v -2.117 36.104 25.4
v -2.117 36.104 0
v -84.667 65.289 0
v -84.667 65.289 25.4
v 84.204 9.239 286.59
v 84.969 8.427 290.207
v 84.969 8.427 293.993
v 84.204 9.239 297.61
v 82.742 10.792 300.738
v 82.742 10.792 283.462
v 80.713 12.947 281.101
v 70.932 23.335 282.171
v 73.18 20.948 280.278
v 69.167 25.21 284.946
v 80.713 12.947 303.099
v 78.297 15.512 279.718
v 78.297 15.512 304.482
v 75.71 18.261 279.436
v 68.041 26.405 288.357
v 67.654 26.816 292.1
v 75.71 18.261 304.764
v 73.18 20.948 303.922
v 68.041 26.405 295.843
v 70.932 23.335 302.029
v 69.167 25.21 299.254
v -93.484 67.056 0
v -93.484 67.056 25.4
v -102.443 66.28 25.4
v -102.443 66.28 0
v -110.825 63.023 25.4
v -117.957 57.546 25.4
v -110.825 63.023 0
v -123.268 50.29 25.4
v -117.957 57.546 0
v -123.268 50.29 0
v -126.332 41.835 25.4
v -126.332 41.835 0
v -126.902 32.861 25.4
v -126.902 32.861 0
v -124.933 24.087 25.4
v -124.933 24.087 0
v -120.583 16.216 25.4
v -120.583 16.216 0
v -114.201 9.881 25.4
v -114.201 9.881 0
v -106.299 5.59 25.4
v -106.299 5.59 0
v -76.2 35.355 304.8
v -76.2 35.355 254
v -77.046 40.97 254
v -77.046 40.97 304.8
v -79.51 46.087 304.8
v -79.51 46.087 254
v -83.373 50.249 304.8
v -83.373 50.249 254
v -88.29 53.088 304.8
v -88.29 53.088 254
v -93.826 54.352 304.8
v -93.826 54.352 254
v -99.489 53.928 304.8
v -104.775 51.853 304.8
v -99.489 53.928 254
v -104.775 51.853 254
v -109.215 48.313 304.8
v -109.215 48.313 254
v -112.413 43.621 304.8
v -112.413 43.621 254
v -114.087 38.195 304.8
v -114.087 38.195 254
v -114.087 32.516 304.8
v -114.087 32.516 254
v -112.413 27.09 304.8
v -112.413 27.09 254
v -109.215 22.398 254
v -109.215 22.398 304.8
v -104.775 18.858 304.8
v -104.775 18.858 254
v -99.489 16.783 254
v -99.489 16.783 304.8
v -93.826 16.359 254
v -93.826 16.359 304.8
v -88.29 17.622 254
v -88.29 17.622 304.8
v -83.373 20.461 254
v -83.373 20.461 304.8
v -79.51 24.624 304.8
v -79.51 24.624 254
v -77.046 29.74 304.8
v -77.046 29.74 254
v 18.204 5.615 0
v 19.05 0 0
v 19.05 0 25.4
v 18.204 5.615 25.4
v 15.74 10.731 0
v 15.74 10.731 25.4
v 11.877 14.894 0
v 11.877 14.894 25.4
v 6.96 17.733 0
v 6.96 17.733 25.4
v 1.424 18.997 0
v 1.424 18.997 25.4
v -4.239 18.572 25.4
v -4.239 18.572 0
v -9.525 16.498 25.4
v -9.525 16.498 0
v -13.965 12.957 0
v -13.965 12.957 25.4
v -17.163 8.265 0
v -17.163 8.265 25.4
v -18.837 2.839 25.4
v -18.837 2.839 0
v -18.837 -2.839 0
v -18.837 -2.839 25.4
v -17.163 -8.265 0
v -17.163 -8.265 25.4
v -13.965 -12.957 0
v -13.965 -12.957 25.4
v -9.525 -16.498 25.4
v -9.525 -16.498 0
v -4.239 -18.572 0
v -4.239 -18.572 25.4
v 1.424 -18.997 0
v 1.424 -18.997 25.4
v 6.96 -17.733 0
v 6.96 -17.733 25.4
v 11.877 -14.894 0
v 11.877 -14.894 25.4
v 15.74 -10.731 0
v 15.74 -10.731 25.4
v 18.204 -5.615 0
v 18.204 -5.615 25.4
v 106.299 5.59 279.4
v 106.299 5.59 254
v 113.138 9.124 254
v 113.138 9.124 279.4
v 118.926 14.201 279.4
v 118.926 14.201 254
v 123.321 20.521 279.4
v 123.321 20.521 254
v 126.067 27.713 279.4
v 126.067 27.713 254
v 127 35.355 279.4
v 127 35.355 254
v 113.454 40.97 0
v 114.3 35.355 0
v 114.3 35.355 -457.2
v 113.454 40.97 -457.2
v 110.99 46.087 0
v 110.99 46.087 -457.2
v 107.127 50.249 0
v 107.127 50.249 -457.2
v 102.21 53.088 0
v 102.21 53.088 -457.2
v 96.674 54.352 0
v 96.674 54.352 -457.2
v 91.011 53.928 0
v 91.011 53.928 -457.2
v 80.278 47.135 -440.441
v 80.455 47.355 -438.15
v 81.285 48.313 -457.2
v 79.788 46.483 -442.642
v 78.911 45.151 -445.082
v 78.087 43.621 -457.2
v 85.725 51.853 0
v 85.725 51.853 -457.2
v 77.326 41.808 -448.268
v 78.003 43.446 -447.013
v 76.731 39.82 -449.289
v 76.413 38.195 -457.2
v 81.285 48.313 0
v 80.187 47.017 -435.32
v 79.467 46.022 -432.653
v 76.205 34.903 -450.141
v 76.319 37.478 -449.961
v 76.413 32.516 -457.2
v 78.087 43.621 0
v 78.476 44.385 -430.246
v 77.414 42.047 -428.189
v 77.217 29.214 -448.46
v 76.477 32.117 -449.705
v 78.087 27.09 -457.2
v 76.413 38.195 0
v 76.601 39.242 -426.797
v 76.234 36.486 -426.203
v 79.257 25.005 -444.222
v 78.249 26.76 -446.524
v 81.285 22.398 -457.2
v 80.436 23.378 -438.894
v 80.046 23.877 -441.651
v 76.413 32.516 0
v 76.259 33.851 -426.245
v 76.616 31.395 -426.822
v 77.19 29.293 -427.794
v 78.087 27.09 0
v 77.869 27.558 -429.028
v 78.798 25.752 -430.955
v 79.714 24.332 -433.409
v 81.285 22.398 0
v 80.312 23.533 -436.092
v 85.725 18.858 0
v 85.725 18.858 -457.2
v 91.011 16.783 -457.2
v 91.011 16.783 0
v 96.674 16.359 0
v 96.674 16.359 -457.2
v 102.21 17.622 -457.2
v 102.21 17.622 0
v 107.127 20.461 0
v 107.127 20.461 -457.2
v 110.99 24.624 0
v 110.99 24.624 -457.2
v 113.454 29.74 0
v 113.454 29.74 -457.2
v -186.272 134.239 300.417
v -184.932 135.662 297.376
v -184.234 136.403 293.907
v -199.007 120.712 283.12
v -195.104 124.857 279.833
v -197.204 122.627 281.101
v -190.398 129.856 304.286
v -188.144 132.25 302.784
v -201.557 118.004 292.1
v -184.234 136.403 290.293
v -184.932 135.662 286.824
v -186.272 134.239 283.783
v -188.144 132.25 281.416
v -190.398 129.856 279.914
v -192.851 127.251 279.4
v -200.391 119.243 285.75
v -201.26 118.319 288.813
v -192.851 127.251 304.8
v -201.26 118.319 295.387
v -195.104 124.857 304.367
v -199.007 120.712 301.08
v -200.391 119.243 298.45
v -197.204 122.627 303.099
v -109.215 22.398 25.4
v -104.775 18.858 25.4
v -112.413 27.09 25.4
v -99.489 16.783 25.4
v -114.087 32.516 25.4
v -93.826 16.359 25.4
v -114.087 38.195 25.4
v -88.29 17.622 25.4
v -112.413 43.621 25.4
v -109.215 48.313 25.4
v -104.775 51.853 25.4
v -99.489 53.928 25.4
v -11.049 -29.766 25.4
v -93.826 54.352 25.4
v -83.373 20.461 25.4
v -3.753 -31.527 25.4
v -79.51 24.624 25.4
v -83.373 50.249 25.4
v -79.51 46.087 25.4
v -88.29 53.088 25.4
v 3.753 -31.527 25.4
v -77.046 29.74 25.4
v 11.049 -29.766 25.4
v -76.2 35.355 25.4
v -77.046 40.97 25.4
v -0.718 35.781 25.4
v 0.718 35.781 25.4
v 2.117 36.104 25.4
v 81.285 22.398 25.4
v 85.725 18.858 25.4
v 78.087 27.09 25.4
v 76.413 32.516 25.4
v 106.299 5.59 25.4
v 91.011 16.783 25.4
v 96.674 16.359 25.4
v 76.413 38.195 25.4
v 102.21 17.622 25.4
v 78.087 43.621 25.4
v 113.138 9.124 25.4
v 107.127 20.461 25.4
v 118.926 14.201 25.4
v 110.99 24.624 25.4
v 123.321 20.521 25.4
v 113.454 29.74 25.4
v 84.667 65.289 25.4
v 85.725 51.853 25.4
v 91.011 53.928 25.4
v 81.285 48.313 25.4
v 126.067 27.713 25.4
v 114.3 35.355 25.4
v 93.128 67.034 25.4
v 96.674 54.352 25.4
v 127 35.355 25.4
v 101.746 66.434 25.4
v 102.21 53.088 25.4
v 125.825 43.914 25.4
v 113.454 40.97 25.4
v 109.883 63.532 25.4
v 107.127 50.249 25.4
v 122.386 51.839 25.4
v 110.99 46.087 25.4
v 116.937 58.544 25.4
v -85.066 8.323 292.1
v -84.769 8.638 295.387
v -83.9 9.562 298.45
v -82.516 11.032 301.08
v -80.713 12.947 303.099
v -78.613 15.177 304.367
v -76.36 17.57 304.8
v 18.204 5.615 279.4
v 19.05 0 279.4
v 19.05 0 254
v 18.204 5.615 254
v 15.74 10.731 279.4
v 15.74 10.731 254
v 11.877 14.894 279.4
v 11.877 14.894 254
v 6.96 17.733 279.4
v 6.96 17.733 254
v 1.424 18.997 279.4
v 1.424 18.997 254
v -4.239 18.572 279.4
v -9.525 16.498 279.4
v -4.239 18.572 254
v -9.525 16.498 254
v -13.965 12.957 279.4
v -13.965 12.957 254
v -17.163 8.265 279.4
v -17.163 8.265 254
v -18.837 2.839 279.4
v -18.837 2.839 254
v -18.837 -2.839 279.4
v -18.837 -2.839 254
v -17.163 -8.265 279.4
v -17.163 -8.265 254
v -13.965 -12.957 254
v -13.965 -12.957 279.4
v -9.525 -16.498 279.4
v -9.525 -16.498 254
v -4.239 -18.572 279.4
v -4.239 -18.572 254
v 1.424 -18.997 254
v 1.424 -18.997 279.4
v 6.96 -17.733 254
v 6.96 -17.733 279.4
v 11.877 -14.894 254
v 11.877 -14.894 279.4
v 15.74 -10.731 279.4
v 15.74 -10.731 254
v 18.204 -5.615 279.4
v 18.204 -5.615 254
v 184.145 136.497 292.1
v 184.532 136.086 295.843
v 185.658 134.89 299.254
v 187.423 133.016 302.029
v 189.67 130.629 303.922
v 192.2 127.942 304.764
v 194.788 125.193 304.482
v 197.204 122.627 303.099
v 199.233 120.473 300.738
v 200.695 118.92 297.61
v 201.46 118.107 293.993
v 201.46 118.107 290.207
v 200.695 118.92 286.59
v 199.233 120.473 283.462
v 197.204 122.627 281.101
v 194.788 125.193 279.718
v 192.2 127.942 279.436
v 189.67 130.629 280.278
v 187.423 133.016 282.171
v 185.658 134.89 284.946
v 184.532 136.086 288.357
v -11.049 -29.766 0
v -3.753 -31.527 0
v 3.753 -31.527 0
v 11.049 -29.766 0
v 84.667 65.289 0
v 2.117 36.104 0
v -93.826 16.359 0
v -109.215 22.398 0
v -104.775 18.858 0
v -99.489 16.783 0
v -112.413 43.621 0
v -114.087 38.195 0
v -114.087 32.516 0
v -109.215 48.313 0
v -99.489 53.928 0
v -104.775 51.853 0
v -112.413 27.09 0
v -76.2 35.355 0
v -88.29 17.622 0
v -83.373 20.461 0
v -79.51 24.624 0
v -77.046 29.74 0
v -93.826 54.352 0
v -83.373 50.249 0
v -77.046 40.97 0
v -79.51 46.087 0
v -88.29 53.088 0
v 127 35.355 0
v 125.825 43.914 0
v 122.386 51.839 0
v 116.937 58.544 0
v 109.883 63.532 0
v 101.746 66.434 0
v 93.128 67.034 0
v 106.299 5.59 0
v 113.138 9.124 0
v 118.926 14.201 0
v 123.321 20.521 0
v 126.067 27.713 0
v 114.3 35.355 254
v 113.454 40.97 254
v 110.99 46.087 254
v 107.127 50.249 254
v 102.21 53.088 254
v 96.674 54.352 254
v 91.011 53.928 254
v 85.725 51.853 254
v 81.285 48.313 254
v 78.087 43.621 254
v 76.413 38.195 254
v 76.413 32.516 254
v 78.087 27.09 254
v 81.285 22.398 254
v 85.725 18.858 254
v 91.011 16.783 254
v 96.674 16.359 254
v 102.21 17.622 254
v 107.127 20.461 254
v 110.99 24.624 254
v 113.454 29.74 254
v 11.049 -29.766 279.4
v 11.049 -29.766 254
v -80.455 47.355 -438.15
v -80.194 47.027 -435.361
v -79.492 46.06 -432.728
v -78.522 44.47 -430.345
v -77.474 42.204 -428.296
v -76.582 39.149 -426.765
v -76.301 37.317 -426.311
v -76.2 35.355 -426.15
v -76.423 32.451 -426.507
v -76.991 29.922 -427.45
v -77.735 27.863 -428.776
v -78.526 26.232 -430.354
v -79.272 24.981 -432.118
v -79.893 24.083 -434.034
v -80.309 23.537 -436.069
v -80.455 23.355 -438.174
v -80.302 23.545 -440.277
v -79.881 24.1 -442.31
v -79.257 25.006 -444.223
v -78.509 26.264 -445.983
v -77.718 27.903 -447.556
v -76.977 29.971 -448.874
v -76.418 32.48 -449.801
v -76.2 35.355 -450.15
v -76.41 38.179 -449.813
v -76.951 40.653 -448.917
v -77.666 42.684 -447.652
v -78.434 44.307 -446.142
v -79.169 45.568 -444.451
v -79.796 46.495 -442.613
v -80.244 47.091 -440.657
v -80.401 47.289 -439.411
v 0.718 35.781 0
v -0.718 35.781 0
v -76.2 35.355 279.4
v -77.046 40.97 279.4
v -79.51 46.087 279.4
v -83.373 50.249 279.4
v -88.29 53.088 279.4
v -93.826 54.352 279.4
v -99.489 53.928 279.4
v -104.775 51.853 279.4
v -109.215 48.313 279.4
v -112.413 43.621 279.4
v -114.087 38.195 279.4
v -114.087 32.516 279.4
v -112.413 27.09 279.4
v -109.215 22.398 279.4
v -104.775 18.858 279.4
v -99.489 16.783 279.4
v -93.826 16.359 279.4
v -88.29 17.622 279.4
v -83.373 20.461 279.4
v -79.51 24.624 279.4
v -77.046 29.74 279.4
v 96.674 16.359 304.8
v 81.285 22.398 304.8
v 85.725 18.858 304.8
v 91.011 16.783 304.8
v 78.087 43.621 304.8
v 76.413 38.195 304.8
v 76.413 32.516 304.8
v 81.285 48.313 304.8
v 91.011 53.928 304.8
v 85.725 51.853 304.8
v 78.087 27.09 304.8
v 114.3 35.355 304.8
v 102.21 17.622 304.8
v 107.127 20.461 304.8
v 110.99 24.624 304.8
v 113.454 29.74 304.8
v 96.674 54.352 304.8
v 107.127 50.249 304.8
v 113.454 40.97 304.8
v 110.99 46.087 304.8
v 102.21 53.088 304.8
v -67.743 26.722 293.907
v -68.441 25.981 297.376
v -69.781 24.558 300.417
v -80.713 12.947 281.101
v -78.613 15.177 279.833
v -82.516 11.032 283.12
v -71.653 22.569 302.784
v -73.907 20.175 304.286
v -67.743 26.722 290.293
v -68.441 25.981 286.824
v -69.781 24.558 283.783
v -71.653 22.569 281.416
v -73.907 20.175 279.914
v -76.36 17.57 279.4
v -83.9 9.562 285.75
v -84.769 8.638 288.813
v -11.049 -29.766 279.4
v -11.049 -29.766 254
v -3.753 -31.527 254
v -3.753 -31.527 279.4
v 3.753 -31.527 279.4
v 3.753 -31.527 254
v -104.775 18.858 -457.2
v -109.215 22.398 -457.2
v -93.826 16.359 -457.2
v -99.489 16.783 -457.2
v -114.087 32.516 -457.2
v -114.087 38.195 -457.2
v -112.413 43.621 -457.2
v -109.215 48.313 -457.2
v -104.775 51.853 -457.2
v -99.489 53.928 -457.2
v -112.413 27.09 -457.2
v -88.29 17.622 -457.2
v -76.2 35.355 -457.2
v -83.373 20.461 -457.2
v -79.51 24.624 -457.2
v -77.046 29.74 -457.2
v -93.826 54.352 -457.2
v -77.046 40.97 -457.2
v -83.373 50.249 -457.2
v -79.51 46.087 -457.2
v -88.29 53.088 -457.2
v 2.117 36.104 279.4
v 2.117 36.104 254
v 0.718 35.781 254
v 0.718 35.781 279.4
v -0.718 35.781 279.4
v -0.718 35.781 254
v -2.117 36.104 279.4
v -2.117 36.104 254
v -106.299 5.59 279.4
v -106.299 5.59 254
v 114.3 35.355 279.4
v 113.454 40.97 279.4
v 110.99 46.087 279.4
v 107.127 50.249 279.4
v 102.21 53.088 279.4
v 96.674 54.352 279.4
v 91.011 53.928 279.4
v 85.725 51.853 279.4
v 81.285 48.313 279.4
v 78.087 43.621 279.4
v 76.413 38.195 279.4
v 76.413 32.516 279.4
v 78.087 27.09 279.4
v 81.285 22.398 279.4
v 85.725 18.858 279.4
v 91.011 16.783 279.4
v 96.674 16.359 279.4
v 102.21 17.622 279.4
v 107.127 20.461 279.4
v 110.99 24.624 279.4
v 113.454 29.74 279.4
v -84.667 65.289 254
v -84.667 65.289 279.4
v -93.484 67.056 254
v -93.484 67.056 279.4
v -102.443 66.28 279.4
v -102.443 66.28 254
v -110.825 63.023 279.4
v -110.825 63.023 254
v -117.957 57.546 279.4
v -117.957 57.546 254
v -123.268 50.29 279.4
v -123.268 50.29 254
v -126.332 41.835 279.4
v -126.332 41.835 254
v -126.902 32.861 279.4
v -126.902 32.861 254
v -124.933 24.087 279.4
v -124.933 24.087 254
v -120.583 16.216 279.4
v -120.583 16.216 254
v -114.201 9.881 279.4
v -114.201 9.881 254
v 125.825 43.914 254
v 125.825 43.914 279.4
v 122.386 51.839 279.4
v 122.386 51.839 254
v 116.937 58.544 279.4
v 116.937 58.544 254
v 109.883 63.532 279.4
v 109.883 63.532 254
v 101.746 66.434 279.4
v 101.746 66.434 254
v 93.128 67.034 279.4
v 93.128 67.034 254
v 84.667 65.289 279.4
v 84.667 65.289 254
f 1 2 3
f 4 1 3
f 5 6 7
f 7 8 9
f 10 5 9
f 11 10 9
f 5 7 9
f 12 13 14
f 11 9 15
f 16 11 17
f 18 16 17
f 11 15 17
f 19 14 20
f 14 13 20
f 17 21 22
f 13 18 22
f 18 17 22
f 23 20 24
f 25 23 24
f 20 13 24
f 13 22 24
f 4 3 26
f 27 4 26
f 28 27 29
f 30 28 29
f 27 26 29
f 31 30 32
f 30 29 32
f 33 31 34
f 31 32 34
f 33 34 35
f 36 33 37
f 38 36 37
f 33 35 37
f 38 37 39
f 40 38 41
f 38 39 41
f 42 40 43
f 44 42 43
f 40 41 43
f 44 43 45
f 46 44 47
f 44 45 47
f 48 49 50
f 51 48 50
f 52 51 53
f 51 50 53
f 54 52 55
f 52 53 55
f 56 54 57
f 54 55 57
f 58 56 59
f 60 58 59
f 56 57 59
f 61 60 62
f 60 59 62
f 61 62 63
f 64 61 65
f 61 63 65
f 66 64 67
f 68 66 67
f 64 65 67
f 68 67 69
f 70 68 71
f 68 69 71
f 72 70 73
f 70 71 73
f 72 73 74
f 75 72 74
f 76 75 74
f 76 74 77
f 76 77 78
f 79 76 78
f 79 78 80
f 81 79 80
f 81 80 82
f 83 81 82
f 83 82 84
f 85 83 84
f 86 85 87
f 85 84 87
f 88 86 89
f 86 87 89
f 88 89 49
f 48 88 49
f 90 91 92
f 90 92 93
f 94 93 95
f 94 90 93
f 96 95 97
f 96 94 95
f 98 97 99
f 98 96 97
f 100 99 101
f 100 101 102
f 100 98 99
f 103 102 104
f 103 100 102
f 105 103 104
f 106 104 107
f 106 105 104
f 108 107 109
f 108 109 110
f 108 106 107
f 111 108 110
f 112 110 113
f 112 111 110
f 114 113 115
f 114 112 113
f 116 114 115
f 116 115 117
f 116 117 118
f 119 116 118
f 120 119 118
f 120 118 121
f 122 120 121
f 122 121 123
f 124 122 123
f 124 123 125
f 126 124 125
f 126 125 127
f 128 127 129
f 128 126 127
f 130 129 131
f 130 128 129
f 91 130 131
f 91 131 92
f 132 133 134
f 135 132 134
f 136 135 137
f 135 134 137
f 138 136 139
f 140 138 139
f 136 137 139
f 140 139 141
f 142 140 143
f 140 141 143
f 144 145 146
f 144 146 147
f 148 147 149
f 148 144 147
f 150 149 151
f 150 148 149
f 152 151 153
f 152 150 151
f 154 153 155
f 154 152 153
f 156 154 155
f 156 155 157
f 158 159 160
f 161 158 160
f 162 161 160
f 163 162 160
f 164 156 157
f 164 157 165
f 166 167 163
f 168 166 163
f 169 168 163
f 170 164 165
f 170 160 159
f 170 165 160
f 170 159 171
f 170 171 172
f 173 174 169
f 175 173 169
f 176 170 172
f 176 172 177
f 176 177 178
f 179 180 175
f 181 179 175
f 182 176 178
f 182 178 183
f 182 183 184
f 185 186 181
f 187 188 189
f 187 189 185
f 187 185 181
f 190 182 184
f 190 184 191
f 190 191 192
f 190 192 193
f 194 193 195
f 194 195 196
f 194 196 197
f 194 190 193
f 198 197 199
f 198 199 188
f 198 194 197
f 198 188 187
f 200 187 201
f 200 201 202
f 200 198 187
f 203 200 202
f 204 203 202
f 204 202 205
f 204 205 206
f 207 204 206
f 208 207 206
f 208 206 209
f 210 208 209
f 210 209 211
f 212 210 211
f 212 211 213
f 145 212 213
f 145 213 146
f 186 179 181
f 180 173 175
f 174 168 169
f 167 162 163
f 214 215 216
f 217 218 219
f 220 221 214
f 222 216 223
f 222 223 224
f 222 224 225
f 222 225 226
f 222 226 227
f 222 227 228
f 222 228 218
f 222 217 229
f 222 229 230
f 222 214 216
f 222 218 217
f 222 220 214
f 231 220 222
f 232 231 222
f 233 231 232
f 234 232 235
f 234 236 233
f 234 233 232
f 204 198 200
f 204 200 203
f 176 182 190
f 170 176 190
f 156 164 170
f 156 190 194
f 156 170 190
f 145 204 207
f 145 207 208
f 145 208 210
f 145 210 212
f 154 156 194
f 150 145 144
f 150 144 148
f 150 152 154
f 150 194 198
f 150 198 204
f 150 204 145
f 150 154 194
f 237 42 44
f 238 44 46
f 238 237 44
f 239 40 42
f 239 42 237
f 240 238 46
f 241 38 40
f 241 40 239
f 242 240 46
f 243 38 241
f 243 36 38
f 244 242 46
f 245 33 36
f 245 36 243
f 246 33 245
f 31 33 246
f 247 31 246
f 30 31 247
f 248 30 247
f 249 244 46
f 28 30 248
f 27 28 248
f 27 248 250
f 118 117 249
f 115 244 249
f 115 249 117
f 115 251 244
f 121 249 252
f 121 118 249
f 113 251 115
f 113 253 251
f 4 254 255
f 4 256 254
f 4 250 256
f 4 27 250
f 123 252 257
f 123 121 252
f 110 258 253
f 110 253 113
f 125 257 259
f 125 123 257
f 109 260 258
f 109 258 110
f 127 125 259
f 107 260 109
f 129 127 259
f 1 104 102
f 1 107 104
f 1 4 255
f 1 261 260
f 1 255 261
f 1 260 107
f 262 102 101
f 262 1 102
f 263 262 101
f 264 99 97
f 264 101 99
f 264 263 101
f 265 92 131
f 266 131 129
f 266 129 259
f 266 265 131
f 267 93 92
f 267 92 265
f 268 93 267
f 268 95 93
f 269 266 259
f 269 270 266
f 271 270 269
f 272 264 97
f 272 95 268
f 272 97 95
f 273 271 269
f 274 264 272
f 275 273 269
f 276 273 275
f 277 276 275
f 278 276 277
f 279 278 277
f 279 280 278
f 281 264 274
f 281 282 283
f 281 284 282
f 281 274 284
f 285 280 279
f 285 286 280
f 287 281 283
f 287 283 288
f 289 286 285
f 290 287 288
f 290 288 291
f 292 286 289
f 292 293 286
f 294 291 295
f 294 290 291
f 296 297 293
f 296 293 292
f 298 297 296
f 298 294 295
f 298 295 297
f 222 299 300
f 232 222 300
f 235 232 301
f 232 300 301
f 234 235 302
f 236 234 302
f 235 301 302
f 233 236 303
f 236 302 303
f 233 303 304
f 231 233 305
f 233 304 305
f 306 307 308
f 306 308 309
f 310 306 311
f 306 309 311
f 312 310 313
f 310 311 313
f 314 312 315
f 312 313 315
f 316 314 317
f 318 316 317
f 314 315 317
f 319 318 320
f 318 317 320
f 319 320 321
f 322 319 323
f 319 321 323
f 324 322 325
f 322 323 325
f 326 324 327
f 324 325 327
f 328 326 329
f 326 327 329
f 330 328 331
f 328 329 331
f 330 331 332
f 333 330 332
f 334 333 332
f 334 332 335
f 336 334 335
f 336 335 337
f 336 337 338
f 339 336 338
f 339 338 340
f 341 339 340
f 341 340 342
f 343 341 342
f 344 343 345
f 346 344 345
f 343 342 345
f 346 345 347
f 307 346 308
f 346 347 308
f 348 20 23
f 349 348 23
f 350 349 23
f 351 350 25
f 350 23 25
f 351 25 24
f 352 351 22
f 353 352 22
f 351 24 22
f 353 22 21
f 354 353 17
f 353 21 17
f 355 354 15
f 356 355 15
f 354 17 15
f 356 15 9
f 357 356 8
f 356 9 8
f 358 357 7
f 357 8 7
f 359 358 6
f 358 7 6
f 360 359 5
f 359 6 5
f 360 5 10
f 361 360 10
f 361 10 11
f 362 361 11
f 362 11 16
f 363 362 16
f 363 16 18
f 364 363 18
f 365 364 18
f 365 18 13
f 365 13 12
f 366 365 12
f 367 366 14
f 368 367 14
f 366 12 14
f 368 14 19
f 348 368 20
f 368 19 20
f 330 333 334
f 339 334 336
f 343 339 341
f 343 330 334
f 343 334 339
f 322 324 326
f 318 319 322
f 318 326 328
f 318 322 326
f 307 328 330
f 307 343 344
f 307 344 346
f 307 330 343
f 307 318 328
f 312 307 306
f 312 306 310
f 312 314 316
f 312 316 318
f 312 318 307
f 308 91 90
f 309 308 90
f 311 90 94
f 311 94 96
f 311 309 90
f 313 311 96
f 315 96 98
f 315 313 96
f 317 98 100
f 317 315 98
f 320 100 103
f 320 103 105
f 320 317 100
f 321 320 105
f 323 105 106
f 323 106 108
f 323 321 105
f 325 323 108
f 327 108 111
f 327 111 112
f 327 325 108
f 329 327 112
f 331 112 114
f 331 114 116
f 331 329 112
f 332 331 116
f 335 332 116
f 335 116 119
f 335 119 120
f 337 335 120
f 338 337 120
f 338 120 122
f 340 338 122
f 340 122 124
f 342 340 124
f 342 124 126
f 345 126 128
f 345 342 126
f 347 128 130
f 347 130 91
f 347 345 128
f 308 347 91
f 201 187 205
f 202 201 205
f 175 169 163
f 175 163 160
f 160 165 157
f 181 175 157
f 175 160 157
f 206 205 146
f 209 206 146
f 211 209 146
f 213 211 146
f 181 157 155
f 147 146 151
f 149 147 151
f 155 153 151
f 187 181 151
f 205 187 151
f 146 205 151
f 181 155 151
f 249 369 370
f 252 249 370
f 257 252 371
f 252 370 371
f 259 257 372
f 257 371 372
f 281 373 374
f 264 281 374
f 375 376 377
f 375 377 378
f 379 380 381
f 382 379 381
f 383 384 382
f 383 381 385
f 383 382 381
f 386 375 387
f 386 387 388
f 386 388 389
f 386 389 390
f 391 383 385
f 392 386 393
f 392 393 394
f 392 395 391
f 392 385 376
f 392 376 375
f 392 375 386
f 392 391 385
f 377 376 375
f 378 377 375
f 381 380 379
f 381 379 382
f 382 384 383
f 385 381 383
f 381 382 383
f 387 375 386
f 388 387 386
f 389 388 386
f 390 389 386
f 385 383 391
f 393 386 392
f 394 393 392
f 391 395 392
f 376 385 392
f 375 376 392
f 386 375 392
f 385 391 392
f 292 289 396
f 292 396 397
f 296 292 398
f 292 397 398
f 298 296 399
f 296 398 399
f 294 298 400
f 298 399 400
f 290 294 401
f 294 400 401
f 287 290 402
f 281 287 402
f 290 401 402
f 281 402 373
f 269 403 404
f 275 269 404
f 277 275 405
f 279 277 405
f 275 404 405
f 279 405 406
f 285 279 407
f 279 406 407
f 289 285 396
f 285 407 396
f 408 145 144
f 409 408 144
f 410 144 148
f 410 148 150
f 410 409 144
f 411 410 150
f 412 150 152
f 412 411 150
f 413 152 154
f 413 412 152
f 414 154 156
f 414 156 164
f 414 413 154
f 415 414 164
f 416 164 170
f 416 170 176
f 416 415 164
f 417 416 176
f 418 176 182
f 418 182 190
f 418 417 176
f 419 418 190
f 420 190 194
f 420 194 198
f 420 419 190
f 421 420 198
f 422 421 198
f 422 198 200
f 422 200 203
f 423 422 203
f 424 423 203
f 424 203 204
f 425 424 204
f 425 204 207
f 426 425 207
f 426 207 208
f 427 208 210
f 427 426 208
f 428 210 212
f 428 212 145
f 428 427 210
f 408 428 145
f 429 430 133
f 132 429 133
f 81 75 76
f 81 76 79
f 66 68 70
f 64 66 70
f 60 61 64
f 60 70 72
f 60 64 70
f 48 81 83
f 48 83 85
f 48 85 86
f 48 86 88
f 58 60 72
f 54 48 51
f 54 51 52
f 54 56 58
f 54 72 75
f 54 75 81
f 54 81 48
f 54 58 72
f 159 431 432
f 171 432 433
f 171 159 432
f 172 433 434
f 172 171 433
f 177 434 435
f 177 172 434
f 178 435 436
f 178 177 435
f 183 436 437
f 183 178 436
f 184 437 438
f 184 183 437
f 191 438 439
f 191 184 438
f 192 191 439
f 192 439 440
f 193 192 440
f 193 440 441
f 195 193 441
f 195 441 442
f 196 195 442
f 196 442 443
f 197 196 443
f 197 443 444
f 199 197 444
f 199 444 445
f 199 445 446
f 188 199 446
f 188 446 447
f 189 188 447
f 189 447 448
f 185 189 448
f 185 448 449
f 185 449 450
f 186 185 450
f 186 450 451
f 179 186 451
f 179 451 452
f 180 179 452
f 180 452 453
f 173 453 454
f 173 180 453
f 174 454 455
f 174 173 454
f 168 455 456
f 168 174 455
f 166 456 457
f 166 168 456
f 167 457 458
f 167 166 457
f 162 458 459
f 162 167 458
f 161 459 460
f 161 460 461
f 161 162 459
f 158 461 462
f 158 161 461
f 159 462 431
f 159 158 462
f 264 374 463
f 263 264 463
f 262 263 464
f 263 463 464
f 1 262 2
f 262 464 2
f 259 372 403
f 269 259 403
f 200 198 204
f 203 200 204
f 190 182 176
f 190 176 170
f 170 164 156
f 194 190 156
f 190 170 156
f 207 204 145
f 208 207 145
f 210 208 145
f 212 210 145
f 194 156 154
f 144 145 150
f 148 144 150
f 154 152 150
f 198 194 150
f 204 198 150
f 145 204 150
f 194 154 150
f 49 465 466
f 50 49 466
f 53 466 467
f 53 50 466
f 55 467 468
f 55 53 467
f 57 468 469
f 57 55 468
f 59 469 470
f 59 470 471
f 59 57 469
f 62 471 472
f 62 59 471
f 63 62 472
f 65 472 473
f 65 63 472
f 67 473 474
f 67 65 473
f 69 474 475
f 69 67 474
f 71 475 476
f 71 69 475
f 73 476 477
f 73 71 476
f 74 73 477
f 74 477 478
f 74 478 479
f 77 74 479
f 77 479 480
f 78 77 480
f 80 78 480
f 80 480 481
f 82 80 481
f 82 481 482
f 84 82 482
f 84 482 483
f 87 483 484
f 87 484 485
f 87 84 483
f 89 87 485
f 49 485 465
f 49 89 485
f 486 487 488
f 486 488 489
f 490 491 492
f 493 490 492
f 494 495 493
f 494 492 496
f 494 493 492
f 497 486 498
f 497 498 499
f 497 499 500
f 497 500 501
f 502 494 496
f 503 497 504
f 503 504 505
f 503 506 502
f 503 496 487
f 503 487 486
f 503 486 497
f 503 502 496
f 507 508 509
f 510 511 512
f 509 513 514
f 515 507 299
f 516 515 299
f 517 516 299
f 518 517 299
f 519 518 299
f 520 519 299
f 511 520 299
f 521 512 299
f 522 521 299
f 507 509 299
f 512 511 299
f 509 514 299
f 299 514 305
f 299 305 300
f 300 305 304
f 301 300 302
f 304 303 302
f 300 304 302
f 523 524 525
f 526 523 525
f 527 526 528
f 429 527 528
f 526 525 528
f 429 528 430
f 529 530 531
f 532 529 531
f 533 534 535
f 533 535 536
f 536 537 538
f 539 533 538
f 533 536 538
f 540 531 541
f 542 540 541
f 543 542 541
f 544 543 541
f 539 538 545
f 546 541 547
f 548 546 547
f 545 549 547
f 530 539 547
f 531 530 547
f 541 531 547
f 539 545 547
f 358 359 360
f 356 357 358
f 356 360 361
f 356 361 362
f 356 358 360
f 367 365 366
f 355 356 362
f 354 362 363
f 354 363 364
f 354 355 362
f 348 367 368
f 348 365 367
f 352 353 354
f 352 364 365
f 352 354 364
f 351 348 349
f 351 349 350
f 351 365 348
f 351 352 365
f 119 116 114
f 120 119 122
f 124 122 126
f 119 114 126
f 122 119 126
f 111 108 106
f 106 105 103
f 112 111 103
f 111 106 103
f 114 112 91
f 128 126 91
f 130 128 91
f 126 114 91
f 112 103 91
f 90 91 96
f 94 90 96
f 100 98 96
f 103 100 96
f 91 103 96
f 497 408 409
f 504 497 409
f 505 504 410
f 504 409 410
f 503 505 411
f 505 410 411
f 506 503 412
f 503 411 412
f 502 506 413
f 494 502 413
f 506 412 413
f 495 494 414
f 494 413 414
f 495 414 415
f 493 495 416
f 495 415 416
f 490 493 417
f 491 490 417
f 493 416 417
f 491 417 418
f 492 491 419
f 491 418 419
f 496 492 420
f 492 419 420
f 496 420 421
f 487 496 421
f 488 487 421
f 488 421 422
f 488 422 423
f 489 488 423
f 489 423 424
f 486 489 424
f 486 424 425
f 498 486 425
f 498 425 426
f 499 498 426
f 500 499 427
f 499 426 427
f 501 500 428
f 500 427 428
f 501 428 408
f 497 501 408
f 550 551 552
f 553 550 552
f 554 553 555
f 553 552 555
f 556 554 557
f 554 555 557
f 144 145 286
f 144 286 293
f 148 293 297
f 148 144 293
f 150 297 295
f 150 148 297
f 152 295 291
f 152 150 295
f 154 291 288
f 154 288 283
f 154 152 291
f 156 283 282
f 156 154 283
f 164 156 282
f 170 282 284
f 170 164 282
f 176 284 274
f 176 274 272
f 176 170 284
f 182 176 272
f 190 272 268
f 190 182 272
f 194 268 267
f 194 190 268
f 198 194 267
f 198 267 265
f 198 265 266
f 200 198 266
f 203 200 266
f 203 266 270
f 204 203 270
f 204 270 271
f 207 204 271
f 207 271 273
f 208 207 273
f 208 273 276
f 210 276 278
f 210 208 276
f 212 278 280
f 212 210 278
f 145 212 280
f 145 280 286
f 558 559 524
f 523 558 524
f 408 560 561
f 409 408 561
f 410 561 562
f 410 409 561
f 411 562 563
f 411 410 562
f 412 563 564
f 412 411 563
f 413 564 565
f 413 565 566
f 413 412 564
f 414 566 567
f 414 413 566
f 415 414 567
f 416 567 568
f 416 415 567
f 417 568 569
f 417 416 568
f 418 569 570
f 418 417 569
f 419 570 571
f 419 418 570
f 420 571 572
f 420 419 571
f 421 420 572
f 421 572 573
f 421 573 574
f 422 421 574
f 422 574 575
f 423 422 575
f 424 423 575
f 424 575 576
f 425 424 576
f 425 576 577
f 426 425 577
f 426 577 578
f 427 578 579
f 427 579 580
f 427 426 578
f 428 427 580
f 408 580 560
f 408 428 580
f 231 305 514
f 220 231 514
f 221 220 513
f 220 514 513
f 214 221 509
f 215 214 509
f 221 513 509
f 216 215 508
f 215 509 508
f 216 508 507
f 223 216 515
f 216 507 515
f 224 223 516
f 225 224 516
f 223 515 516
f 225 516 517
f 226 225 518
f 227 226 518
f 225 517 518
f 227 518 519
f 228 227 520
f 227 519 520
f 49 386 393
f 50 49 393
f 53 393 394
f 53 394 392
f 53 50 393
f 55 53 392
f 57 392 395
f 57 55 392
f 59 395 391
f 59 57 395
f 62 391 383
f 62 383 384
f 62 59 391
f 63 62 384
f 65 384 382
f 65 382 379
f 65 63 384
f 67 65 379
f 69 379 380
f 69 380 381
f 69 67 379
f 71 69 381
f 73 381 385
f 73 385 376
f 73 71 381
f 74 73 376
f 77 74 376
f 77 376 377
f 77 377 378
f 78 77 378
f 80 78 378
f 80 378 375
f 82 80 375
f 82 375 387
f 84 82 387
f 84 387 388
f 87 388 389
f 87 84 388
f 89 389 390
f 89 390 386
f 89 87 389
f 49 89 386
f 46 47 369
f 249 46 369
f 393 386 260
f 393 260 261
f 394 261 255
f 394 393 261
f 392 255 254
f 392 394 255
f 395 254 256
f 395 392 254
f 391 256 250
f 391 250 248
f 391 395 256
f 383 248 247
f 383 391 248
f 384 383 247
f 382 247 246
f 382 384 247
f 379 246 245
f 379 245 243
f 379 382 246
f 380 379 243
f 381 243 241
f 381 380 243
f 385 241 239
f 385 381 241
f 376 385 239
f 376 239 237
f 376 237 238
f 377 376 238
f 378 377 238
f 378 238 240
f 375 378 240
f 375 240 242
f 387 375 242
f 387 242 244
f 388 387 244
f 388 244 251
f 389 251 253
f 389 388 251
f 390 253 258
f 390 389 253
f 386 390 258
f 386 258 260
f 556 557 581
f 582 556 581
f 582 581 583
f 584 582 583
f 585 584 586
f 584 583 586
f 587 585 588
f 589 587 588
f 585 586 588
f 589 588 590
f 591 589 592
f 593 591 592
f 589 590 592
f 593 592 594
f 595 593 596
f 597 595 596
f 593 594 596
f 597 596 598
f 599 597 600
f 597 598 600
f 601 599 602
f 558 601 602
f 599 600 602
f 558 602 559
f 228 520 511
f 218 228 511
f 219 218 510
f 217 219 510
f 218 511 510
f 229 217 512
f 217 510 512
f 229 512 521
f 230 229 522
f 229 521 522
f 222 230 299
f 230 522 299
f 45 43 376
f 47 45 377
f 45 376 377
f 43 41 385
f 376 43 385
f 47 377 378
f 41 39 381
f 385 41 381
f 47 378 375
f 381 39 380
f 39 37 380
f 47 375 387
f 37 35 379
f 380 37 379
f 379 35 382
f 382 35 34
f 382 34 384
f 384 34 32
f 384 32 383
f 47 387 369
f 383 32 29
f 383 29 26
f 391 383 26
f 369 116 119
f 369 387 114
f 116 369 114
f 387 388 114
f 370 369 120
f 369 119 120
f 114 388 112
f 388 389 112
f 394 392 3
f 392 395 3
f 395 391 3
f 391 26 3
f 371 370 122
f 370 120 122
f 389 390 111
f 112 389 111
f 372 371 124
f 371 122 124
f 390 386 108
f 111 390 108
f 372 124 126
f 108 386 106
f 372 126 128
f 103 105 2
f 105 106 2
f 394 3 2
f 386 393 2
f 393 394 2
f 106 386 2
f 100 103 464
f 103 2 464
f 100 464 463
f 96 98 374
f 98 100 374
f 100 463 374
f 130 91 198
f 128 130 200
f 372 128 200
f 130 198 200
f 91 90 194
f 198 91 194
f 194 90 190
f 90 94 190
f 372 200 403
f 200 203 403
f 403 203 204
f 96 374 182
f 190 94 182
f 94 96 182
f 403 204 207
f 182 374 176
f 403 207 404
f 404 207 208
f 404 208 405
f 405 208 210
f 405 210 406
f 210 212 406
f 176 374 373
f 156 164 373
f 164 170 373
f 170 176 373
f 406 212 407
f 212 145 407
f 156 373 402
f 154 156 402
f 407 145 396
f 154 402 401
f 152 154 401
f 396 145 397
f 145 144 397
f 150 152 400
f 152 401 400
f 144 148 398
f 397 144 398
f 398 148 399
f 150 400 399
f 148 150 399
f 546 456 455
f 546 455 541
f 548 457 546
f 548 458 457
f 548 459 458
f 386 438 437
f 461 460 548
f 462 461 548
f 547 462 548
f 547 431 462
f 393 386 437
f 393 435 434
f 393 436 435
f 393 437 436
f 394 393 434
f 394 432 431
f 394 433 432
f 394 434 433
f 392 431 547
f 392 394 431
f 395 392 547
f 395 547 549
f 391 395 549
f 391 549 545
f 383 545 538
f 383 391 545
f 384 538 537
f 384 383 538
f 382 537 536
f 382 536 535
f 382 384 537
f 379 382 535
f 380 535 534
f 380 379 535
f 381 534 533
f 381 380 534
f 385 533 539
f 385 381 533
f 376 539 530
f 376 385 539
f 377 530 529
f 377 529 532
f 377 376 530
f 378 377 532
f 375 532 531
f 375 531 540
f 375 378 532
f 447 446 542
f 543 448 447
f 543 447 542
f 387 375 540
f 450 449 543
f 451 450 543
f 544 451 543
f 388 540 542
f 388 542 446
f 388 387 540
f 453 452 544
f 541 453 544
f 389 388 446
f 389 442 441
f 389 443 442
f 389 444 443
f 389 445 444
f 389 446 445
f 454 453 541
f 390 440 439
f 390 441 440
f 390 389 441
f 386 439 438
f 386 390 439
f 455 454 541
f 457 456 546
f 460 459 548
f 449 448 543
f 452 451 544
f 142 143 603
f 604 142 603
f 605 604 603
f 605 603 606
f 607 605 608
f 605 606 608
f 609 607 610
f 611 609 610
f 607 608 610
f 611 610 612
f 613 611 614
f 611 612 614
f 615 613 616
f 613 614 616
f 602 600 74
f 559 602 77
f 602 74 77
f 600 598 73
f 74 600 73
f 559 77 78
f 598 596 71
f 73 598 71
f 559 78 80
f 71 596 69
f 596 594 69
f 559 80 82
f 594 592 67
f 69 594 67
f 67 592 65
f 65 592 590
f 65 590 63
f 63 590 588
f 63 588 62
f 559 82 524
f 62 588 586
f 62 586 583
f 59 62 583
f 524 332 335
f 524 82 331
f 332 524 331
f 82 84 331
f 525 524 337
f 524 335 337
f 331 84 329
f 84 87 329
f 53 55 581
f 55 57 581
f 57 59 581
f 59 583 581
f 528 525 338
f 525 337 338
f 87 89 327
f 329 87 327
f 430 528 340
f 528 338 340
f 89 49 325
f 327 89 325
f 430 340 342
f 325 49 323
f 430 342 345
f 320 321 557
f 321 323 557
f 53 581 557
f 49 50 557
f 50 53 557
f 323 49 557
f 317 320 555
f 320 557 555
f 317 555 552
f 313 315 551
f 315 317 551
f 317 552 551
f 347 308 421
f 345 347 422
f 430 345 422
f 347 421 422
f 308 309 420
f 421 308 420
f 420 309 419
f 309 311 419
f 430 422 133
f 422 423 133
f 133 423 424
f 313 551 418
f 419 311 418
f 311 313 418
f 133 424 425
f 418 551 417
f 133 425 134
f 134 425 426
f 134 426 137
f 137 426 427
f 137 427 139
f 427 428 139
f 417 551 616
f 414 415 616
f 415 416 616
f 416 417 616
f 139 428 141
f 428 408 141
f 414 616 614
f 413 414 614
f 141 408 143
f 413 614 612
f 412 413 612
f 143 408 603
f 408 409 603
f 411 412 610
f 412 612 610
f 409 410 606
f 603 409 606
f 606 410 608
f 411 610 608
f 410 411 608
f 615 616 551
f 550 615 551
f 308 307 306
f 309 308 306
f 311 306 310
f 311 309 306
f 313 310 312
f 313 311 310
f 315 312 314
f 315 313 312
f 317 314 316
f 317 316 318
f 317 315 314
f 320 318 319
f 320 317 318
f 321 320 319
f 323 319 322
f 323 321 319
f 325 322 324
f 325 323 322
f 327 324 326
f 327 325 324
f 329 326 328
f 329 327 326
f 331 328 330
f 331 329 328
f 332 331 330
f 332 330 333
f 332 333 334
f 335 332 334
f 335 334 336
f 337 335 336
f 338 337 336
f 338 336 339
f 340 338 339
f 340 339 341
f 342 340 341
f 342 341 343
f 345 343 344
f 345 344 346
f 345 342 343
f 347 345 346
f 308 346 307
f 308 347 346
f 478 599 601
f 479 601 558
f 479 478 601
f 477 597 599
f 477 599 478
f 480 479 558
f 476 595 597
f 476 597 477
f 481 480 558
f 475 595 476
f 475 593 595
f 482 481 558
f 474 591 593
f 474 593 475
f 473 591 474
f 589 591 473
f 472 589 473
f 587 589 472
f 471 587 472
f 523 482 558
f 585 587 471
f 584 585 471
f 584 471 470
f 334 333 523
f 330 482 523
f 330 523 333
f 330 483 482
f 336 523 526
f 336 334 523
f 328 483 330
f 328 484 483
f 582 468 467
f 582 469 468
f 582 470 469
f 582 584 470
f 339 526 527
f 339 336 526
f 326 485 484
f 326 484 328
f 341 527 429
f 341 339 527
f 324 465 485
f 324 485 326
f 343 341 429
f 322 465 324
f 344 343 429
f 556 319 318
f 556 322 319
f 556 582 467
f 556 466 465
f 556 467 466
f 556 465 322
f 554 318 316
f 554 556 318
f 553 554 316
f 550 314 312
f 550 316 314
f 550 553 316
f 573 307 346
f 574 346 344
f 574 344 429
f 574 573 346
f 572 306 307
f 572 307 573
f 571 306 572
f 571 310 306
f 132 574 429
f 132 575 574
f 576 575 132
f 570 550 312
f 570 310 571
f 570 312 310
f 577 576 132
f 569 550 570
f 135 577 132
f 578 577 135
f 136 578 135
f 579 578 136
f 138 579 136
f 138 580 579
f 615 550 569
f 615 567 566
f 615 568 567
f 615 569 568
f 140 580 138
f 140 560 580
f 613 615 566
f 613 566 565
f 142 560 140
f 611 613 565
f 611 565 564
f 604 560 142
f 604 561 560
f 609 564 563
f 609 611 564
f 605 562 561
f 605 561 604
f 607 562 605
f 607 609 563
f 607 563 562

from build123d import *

# Parameters (mm, degrees)
F0_R          = 19.05
F3_DEPTH      = 25.4
F2_R          = 19.05
F4_DEPTH      = 25.4
F5_DEPTH      = 457.2
F6_DEPTH      = 254
F6_DEPTH_BACK = 50.8
F7_DEPTH      = 254
F7_DEPTH_BACK = 25.4
F11_R         = 12
F12_DEPTH     = 180
F18_R         = 12.7
F19_DEPTH     = 160
F21_DEPTH     = 160


with BuildPart() as f3:
    # F0 (on Top) → F3 (new body)
    with BuildSketch(Plane.XY):
        with BuildLine():
            ThreePointArc((-106.2985327043, 5.5896788142), (-77.121685315, 9.2894887986), (-63.5, 35.355303704))
            ThreePointArc((-63.5, 35.355303704), (-69.3262335555, 53.6861747507), (-84.6666666667, 65.2894907742))
            ThreePointArc((-84.6666666667, 65.2894907742), (-125.1008122106, 46.17156509), (-106.2985327043, 5.5896788142))
        make_face()
        with Locations((-95.25, 35.355303704)):
            Circle(F0_R, mode=Mode.SUBTRACT)
        with BuildLine():
            ThreePointArc((-84.6666666667, 65.2894907742), (-69.3262335555, 53.6861747507), (-63.5, 35.355303704))
            ThreePointArc((-63.5, 35.355303704), (-77.121685315, 9.2894887986), (-106.2985327043, 5.5896788142))
            Line((-106.2985327043, 5.5896788142), (-11.048533057, -29.7656258398))
            ThreePointArc((-11.048533057, -29.7656258398), (-18.1283152636, 26.0658157373), (31.7500010133, 0))
            ThreePointArc((31.7500010133, 0), (26.0658157373, -18.1283152636), (11.048533057, -29.7656258398))
            Line((11.048533057, -29.7656258398), (106.2985327043, 5.5896788142))
            ThreePointArc((106.2985327043, 5.5896788142), (65.3991877894, 24.539042318), (84.6666666667, 65.2894907742))
            Line((84.6666666667, 65.2894907742), (2.1166666667, 36.1036583807))
            ThreePointArc((2.1166666667, 36.1036583807), (0, 35.7404957948), (-2.1166666667, 36.1036583807))
            Line((-2.1166666667, 36.1036583807), (-84.6666666667, 65.2894907742))
        make_face()
        with BuildLine():
            ThreePointArc((31.7500010133, 0), (-18.1283152636, 26.0658157373), (-11.048533057, -29.7656258398))
            ThreePointArc((-11.048533057, -29.7656258398), (0, -31.7500010133), (11.048533057, -29.7656258398))
            ThreePointArc((11.048533057, -29.7656258398), (26.0658157373, -18.1283152636), (31.7500010133, 0))
        make_face()
        Circle(F0_R, mode=Mode.SUBTRACT)
        with BuildLine():
            ThreePointArc((127, 35.355303704), (113.5808710468, 61.2790701484), (84.6666666667, 65.2894907742))
            ThreePointArc((84.6666666667, 65.2894907742), (65.3991877894, 24.539042318), (106.2985327043, 5.5896788142))
            ThreePointArc((106.2985327043, 5.5896788142), (121.3158149054, 17.226989019), (127, 35.355303704))
        make_face()
        with Locations((95.25, 35.355303704)):
            Circle(F0_R, mode=Mode.SUBTRACT)
    extrude(amount=F3_DEPTH)


with BuildPart() as f4:
    # F2 (on offset) → F4 (new body)
    with BuildSketch(Plane.XY.offset(254)):
        with BuildLine():
            ThreePointArc((-106.2985327043, 5.5896788142), (-77.121685315, 9.2894887986), (-63.5, 35.355303704))
            ThreePointArc((-63.5, 35.355303704), (-69.3262335555, 53.6861747507), (-84.6666666667, 65.2894907742))
            ThreePointArc((-84.6666666667, 65.2894907742), (-125.1008122106, 46.17156509), (-106.2985327043, 5.5896788142))
        make_face()
        with Locations((-95.25, 35.355303704)):
            Circle(F2_R, mode=Mode.SUBTRACT)
        with BuildLine():
            ThreePointArc((-84.6666666667, 65.2894907742), (-69.3262335555, 53.6861747507), (-63.5, 35.355303704))
            ThreePointArc((-63.5, 35.355303704), (-77.121685315, 9.2894887986), (-106.2985327043, 5.5896788142))
            Line((-106.2985327043, 5.5896788142), (-11.048533057, -29.7656258398))
            ThreePointArc((-11.048533057, -29.7656258398), (-18.1283152636, 26.0658157373), (31.7500010133, 0))
            ThreePointArc((31.7500010133, 0), (26.0658157373, -18.1283152636), (11.048533057, -29.7656258398))
            Line((11.048533057, -29.7656258398), (106.2985327043, 5.5896788142))
            ThreePointArc((106.2985327043, 5.5896788142), (65.3991877894, 24.539042318), (84.6666666667, 65.2894907742))
            Line((84.6666666667, 65.2894907742), (2.1166666667, 36.1036583807))
            ThreePointArc((2.1166666667, 36.1036583807), (0, 35.7404957948), (-2.1166666667, 36.1036583807))
            Line((-2.1166666667, 36.1036583807), (-84.6666666667, 65.2894907742))
        make_face()
        with BuildLine():
            ThreePointArc((31.7500010133, 0), (-18.1283152636, 26.0658157373), (-11.048533057, -29.7656258398))
            ThreePointArc((-11.048533057, -29.7656258398), (0, -31.7500010133), (11.048533057, -29.7656258398))
            ThreePointArc((11.048533057, -29.7656258398), (26.0658157373, -18.1283152636), (31.7500010133, 0))
        make_face()
        Circle(F2_R, mode=Mode.SUBTRACT)
        with BuildLine():
            ThreePointArc((127, 35.355303704), (113.5808710468, 61.2790701484), (84.6666666667, 65.2894907742))
            ThreePointArc((84.6666666667, 65.2894907742), (65.3991877894, 24.539042318), (106.2985327043, 5.5896788142))
            ThreePointArc((106.2985327043, 5.5896788142), (121.3158149054, 17.226989019), (127, 35.355303704))
        make_face()
        with Locations((95.25, 35.355303704)):
            Circle(F2_R, mode=Mode.SUBTRACT)
    extrude(amount=F4_DEPTH)


with BuildPart() as f5:
    # F0 (on Top) → F5 (new body)
    with BuildSketch(Plane.XY):
        with Locations((-95.25, 35.355303704)):
            Circle(F0_R)
    extrude(amount=-F5_DEPTH)



with BuildPart() as f5b:
    # F0 (on Top) → F5, piece 2 (new body)
    with BuildSketch(Plane.XY):
        with Locations((95.25, 35.355303704)):
            Circle(F0_R)
    extrude(amount=-F5_DEPTH)


with BuildPart() as f6:
    # F2 (on offset) → F6 (new body, two sides)
    with BuildSketch(Plane.XY.offset(254)) as f6_sk:
        with Locations((-95.25, 35.355303704)):
            Circle(F2_R)
    extrude(amount=-F6_DEPTH)
    extrude(f6_sk.sketch, amount=F6_DEPTH_BACK)


with BuildPart() as f6b:
    # F2 (on offset) → F6, piece 2 (new body, two sides)
    with BuildSketch(Plane.XY.offset(254)) as f6_2_sk:
        with Locations((95.25, 35.355303704)):
            Circle(F2_R)
    extrude(amount=-F6_DEPTH)
    extrude(f6_2_sk.sketch, amount=F6_DEPTH_BACK)


with BuildPart() as f7:
    # F2 (on offset) → F7 (new body, two sides)
    with BuildSketch(Plane.XY.offset(254)) as f7_sk:
        Circle(F2_R)
    extrude(amount=-F7_DEPTH)
    extrude(f7_sk.sketch, amount=F7_DEPTH_BACK)


with BuildPart() as f5_1:
    add(f5.part)

    add(f5b.part)  # F12 merges F5b
    # F11 (on face) → F12 (join)
    with BuildSketch(Plane.YZ.offset(95.25)):
        with Locations((35.355303704, -438.15)):
            Circle(F11_R)
    extrude(amount=-F12_DEPTH)


with BuildPart() as f19:
    # F18 (on offset) → F19 (new body)
    with BuildSketch(Plane(origin=(49.2461853383, 46.3672973092, 0), x_dir=(-0.6855053809, 0.7280675605, 0), z_dir=(0.7280675605, 0.6855053809, 0))):
        with Locations((-39.5533378152, 292.1)):
            Circle(F18_R)
    extrude(amount=F19_DEPTH)


with BuildPart() as f21:
    # F20 (on offset) → F21 (new body)
    with BuildSketch(Plane(origin=(-49.2461853383, 46.3672973092, 0), x_dir=(-0.6855053809, -0.7280675605, 0), z_dir=(-0.7280675605, 0.6855053809, 0))):
        with BuildLine():
            ThreePointArc((52.2533378152, 292.1), (48.5335939363, 301.0802561211), (39.5533378152, 304.8))
            ThreePointArc((39.5533378152, 304.8), (26.8533378152, 292.1), (39.5533378152, 279.4))
            ThreePointArc((39.5533378152, 279.4), (48.5335939363, 283.1197438789), (52.2533378152, 292.1))
        make_face()
    extrude(amount=F21_DEPTH)


solid = Compound([f3.part, f4.part, f6.part, f6b.part, f7.part, f5_1.part, f19.part, f21.part])
